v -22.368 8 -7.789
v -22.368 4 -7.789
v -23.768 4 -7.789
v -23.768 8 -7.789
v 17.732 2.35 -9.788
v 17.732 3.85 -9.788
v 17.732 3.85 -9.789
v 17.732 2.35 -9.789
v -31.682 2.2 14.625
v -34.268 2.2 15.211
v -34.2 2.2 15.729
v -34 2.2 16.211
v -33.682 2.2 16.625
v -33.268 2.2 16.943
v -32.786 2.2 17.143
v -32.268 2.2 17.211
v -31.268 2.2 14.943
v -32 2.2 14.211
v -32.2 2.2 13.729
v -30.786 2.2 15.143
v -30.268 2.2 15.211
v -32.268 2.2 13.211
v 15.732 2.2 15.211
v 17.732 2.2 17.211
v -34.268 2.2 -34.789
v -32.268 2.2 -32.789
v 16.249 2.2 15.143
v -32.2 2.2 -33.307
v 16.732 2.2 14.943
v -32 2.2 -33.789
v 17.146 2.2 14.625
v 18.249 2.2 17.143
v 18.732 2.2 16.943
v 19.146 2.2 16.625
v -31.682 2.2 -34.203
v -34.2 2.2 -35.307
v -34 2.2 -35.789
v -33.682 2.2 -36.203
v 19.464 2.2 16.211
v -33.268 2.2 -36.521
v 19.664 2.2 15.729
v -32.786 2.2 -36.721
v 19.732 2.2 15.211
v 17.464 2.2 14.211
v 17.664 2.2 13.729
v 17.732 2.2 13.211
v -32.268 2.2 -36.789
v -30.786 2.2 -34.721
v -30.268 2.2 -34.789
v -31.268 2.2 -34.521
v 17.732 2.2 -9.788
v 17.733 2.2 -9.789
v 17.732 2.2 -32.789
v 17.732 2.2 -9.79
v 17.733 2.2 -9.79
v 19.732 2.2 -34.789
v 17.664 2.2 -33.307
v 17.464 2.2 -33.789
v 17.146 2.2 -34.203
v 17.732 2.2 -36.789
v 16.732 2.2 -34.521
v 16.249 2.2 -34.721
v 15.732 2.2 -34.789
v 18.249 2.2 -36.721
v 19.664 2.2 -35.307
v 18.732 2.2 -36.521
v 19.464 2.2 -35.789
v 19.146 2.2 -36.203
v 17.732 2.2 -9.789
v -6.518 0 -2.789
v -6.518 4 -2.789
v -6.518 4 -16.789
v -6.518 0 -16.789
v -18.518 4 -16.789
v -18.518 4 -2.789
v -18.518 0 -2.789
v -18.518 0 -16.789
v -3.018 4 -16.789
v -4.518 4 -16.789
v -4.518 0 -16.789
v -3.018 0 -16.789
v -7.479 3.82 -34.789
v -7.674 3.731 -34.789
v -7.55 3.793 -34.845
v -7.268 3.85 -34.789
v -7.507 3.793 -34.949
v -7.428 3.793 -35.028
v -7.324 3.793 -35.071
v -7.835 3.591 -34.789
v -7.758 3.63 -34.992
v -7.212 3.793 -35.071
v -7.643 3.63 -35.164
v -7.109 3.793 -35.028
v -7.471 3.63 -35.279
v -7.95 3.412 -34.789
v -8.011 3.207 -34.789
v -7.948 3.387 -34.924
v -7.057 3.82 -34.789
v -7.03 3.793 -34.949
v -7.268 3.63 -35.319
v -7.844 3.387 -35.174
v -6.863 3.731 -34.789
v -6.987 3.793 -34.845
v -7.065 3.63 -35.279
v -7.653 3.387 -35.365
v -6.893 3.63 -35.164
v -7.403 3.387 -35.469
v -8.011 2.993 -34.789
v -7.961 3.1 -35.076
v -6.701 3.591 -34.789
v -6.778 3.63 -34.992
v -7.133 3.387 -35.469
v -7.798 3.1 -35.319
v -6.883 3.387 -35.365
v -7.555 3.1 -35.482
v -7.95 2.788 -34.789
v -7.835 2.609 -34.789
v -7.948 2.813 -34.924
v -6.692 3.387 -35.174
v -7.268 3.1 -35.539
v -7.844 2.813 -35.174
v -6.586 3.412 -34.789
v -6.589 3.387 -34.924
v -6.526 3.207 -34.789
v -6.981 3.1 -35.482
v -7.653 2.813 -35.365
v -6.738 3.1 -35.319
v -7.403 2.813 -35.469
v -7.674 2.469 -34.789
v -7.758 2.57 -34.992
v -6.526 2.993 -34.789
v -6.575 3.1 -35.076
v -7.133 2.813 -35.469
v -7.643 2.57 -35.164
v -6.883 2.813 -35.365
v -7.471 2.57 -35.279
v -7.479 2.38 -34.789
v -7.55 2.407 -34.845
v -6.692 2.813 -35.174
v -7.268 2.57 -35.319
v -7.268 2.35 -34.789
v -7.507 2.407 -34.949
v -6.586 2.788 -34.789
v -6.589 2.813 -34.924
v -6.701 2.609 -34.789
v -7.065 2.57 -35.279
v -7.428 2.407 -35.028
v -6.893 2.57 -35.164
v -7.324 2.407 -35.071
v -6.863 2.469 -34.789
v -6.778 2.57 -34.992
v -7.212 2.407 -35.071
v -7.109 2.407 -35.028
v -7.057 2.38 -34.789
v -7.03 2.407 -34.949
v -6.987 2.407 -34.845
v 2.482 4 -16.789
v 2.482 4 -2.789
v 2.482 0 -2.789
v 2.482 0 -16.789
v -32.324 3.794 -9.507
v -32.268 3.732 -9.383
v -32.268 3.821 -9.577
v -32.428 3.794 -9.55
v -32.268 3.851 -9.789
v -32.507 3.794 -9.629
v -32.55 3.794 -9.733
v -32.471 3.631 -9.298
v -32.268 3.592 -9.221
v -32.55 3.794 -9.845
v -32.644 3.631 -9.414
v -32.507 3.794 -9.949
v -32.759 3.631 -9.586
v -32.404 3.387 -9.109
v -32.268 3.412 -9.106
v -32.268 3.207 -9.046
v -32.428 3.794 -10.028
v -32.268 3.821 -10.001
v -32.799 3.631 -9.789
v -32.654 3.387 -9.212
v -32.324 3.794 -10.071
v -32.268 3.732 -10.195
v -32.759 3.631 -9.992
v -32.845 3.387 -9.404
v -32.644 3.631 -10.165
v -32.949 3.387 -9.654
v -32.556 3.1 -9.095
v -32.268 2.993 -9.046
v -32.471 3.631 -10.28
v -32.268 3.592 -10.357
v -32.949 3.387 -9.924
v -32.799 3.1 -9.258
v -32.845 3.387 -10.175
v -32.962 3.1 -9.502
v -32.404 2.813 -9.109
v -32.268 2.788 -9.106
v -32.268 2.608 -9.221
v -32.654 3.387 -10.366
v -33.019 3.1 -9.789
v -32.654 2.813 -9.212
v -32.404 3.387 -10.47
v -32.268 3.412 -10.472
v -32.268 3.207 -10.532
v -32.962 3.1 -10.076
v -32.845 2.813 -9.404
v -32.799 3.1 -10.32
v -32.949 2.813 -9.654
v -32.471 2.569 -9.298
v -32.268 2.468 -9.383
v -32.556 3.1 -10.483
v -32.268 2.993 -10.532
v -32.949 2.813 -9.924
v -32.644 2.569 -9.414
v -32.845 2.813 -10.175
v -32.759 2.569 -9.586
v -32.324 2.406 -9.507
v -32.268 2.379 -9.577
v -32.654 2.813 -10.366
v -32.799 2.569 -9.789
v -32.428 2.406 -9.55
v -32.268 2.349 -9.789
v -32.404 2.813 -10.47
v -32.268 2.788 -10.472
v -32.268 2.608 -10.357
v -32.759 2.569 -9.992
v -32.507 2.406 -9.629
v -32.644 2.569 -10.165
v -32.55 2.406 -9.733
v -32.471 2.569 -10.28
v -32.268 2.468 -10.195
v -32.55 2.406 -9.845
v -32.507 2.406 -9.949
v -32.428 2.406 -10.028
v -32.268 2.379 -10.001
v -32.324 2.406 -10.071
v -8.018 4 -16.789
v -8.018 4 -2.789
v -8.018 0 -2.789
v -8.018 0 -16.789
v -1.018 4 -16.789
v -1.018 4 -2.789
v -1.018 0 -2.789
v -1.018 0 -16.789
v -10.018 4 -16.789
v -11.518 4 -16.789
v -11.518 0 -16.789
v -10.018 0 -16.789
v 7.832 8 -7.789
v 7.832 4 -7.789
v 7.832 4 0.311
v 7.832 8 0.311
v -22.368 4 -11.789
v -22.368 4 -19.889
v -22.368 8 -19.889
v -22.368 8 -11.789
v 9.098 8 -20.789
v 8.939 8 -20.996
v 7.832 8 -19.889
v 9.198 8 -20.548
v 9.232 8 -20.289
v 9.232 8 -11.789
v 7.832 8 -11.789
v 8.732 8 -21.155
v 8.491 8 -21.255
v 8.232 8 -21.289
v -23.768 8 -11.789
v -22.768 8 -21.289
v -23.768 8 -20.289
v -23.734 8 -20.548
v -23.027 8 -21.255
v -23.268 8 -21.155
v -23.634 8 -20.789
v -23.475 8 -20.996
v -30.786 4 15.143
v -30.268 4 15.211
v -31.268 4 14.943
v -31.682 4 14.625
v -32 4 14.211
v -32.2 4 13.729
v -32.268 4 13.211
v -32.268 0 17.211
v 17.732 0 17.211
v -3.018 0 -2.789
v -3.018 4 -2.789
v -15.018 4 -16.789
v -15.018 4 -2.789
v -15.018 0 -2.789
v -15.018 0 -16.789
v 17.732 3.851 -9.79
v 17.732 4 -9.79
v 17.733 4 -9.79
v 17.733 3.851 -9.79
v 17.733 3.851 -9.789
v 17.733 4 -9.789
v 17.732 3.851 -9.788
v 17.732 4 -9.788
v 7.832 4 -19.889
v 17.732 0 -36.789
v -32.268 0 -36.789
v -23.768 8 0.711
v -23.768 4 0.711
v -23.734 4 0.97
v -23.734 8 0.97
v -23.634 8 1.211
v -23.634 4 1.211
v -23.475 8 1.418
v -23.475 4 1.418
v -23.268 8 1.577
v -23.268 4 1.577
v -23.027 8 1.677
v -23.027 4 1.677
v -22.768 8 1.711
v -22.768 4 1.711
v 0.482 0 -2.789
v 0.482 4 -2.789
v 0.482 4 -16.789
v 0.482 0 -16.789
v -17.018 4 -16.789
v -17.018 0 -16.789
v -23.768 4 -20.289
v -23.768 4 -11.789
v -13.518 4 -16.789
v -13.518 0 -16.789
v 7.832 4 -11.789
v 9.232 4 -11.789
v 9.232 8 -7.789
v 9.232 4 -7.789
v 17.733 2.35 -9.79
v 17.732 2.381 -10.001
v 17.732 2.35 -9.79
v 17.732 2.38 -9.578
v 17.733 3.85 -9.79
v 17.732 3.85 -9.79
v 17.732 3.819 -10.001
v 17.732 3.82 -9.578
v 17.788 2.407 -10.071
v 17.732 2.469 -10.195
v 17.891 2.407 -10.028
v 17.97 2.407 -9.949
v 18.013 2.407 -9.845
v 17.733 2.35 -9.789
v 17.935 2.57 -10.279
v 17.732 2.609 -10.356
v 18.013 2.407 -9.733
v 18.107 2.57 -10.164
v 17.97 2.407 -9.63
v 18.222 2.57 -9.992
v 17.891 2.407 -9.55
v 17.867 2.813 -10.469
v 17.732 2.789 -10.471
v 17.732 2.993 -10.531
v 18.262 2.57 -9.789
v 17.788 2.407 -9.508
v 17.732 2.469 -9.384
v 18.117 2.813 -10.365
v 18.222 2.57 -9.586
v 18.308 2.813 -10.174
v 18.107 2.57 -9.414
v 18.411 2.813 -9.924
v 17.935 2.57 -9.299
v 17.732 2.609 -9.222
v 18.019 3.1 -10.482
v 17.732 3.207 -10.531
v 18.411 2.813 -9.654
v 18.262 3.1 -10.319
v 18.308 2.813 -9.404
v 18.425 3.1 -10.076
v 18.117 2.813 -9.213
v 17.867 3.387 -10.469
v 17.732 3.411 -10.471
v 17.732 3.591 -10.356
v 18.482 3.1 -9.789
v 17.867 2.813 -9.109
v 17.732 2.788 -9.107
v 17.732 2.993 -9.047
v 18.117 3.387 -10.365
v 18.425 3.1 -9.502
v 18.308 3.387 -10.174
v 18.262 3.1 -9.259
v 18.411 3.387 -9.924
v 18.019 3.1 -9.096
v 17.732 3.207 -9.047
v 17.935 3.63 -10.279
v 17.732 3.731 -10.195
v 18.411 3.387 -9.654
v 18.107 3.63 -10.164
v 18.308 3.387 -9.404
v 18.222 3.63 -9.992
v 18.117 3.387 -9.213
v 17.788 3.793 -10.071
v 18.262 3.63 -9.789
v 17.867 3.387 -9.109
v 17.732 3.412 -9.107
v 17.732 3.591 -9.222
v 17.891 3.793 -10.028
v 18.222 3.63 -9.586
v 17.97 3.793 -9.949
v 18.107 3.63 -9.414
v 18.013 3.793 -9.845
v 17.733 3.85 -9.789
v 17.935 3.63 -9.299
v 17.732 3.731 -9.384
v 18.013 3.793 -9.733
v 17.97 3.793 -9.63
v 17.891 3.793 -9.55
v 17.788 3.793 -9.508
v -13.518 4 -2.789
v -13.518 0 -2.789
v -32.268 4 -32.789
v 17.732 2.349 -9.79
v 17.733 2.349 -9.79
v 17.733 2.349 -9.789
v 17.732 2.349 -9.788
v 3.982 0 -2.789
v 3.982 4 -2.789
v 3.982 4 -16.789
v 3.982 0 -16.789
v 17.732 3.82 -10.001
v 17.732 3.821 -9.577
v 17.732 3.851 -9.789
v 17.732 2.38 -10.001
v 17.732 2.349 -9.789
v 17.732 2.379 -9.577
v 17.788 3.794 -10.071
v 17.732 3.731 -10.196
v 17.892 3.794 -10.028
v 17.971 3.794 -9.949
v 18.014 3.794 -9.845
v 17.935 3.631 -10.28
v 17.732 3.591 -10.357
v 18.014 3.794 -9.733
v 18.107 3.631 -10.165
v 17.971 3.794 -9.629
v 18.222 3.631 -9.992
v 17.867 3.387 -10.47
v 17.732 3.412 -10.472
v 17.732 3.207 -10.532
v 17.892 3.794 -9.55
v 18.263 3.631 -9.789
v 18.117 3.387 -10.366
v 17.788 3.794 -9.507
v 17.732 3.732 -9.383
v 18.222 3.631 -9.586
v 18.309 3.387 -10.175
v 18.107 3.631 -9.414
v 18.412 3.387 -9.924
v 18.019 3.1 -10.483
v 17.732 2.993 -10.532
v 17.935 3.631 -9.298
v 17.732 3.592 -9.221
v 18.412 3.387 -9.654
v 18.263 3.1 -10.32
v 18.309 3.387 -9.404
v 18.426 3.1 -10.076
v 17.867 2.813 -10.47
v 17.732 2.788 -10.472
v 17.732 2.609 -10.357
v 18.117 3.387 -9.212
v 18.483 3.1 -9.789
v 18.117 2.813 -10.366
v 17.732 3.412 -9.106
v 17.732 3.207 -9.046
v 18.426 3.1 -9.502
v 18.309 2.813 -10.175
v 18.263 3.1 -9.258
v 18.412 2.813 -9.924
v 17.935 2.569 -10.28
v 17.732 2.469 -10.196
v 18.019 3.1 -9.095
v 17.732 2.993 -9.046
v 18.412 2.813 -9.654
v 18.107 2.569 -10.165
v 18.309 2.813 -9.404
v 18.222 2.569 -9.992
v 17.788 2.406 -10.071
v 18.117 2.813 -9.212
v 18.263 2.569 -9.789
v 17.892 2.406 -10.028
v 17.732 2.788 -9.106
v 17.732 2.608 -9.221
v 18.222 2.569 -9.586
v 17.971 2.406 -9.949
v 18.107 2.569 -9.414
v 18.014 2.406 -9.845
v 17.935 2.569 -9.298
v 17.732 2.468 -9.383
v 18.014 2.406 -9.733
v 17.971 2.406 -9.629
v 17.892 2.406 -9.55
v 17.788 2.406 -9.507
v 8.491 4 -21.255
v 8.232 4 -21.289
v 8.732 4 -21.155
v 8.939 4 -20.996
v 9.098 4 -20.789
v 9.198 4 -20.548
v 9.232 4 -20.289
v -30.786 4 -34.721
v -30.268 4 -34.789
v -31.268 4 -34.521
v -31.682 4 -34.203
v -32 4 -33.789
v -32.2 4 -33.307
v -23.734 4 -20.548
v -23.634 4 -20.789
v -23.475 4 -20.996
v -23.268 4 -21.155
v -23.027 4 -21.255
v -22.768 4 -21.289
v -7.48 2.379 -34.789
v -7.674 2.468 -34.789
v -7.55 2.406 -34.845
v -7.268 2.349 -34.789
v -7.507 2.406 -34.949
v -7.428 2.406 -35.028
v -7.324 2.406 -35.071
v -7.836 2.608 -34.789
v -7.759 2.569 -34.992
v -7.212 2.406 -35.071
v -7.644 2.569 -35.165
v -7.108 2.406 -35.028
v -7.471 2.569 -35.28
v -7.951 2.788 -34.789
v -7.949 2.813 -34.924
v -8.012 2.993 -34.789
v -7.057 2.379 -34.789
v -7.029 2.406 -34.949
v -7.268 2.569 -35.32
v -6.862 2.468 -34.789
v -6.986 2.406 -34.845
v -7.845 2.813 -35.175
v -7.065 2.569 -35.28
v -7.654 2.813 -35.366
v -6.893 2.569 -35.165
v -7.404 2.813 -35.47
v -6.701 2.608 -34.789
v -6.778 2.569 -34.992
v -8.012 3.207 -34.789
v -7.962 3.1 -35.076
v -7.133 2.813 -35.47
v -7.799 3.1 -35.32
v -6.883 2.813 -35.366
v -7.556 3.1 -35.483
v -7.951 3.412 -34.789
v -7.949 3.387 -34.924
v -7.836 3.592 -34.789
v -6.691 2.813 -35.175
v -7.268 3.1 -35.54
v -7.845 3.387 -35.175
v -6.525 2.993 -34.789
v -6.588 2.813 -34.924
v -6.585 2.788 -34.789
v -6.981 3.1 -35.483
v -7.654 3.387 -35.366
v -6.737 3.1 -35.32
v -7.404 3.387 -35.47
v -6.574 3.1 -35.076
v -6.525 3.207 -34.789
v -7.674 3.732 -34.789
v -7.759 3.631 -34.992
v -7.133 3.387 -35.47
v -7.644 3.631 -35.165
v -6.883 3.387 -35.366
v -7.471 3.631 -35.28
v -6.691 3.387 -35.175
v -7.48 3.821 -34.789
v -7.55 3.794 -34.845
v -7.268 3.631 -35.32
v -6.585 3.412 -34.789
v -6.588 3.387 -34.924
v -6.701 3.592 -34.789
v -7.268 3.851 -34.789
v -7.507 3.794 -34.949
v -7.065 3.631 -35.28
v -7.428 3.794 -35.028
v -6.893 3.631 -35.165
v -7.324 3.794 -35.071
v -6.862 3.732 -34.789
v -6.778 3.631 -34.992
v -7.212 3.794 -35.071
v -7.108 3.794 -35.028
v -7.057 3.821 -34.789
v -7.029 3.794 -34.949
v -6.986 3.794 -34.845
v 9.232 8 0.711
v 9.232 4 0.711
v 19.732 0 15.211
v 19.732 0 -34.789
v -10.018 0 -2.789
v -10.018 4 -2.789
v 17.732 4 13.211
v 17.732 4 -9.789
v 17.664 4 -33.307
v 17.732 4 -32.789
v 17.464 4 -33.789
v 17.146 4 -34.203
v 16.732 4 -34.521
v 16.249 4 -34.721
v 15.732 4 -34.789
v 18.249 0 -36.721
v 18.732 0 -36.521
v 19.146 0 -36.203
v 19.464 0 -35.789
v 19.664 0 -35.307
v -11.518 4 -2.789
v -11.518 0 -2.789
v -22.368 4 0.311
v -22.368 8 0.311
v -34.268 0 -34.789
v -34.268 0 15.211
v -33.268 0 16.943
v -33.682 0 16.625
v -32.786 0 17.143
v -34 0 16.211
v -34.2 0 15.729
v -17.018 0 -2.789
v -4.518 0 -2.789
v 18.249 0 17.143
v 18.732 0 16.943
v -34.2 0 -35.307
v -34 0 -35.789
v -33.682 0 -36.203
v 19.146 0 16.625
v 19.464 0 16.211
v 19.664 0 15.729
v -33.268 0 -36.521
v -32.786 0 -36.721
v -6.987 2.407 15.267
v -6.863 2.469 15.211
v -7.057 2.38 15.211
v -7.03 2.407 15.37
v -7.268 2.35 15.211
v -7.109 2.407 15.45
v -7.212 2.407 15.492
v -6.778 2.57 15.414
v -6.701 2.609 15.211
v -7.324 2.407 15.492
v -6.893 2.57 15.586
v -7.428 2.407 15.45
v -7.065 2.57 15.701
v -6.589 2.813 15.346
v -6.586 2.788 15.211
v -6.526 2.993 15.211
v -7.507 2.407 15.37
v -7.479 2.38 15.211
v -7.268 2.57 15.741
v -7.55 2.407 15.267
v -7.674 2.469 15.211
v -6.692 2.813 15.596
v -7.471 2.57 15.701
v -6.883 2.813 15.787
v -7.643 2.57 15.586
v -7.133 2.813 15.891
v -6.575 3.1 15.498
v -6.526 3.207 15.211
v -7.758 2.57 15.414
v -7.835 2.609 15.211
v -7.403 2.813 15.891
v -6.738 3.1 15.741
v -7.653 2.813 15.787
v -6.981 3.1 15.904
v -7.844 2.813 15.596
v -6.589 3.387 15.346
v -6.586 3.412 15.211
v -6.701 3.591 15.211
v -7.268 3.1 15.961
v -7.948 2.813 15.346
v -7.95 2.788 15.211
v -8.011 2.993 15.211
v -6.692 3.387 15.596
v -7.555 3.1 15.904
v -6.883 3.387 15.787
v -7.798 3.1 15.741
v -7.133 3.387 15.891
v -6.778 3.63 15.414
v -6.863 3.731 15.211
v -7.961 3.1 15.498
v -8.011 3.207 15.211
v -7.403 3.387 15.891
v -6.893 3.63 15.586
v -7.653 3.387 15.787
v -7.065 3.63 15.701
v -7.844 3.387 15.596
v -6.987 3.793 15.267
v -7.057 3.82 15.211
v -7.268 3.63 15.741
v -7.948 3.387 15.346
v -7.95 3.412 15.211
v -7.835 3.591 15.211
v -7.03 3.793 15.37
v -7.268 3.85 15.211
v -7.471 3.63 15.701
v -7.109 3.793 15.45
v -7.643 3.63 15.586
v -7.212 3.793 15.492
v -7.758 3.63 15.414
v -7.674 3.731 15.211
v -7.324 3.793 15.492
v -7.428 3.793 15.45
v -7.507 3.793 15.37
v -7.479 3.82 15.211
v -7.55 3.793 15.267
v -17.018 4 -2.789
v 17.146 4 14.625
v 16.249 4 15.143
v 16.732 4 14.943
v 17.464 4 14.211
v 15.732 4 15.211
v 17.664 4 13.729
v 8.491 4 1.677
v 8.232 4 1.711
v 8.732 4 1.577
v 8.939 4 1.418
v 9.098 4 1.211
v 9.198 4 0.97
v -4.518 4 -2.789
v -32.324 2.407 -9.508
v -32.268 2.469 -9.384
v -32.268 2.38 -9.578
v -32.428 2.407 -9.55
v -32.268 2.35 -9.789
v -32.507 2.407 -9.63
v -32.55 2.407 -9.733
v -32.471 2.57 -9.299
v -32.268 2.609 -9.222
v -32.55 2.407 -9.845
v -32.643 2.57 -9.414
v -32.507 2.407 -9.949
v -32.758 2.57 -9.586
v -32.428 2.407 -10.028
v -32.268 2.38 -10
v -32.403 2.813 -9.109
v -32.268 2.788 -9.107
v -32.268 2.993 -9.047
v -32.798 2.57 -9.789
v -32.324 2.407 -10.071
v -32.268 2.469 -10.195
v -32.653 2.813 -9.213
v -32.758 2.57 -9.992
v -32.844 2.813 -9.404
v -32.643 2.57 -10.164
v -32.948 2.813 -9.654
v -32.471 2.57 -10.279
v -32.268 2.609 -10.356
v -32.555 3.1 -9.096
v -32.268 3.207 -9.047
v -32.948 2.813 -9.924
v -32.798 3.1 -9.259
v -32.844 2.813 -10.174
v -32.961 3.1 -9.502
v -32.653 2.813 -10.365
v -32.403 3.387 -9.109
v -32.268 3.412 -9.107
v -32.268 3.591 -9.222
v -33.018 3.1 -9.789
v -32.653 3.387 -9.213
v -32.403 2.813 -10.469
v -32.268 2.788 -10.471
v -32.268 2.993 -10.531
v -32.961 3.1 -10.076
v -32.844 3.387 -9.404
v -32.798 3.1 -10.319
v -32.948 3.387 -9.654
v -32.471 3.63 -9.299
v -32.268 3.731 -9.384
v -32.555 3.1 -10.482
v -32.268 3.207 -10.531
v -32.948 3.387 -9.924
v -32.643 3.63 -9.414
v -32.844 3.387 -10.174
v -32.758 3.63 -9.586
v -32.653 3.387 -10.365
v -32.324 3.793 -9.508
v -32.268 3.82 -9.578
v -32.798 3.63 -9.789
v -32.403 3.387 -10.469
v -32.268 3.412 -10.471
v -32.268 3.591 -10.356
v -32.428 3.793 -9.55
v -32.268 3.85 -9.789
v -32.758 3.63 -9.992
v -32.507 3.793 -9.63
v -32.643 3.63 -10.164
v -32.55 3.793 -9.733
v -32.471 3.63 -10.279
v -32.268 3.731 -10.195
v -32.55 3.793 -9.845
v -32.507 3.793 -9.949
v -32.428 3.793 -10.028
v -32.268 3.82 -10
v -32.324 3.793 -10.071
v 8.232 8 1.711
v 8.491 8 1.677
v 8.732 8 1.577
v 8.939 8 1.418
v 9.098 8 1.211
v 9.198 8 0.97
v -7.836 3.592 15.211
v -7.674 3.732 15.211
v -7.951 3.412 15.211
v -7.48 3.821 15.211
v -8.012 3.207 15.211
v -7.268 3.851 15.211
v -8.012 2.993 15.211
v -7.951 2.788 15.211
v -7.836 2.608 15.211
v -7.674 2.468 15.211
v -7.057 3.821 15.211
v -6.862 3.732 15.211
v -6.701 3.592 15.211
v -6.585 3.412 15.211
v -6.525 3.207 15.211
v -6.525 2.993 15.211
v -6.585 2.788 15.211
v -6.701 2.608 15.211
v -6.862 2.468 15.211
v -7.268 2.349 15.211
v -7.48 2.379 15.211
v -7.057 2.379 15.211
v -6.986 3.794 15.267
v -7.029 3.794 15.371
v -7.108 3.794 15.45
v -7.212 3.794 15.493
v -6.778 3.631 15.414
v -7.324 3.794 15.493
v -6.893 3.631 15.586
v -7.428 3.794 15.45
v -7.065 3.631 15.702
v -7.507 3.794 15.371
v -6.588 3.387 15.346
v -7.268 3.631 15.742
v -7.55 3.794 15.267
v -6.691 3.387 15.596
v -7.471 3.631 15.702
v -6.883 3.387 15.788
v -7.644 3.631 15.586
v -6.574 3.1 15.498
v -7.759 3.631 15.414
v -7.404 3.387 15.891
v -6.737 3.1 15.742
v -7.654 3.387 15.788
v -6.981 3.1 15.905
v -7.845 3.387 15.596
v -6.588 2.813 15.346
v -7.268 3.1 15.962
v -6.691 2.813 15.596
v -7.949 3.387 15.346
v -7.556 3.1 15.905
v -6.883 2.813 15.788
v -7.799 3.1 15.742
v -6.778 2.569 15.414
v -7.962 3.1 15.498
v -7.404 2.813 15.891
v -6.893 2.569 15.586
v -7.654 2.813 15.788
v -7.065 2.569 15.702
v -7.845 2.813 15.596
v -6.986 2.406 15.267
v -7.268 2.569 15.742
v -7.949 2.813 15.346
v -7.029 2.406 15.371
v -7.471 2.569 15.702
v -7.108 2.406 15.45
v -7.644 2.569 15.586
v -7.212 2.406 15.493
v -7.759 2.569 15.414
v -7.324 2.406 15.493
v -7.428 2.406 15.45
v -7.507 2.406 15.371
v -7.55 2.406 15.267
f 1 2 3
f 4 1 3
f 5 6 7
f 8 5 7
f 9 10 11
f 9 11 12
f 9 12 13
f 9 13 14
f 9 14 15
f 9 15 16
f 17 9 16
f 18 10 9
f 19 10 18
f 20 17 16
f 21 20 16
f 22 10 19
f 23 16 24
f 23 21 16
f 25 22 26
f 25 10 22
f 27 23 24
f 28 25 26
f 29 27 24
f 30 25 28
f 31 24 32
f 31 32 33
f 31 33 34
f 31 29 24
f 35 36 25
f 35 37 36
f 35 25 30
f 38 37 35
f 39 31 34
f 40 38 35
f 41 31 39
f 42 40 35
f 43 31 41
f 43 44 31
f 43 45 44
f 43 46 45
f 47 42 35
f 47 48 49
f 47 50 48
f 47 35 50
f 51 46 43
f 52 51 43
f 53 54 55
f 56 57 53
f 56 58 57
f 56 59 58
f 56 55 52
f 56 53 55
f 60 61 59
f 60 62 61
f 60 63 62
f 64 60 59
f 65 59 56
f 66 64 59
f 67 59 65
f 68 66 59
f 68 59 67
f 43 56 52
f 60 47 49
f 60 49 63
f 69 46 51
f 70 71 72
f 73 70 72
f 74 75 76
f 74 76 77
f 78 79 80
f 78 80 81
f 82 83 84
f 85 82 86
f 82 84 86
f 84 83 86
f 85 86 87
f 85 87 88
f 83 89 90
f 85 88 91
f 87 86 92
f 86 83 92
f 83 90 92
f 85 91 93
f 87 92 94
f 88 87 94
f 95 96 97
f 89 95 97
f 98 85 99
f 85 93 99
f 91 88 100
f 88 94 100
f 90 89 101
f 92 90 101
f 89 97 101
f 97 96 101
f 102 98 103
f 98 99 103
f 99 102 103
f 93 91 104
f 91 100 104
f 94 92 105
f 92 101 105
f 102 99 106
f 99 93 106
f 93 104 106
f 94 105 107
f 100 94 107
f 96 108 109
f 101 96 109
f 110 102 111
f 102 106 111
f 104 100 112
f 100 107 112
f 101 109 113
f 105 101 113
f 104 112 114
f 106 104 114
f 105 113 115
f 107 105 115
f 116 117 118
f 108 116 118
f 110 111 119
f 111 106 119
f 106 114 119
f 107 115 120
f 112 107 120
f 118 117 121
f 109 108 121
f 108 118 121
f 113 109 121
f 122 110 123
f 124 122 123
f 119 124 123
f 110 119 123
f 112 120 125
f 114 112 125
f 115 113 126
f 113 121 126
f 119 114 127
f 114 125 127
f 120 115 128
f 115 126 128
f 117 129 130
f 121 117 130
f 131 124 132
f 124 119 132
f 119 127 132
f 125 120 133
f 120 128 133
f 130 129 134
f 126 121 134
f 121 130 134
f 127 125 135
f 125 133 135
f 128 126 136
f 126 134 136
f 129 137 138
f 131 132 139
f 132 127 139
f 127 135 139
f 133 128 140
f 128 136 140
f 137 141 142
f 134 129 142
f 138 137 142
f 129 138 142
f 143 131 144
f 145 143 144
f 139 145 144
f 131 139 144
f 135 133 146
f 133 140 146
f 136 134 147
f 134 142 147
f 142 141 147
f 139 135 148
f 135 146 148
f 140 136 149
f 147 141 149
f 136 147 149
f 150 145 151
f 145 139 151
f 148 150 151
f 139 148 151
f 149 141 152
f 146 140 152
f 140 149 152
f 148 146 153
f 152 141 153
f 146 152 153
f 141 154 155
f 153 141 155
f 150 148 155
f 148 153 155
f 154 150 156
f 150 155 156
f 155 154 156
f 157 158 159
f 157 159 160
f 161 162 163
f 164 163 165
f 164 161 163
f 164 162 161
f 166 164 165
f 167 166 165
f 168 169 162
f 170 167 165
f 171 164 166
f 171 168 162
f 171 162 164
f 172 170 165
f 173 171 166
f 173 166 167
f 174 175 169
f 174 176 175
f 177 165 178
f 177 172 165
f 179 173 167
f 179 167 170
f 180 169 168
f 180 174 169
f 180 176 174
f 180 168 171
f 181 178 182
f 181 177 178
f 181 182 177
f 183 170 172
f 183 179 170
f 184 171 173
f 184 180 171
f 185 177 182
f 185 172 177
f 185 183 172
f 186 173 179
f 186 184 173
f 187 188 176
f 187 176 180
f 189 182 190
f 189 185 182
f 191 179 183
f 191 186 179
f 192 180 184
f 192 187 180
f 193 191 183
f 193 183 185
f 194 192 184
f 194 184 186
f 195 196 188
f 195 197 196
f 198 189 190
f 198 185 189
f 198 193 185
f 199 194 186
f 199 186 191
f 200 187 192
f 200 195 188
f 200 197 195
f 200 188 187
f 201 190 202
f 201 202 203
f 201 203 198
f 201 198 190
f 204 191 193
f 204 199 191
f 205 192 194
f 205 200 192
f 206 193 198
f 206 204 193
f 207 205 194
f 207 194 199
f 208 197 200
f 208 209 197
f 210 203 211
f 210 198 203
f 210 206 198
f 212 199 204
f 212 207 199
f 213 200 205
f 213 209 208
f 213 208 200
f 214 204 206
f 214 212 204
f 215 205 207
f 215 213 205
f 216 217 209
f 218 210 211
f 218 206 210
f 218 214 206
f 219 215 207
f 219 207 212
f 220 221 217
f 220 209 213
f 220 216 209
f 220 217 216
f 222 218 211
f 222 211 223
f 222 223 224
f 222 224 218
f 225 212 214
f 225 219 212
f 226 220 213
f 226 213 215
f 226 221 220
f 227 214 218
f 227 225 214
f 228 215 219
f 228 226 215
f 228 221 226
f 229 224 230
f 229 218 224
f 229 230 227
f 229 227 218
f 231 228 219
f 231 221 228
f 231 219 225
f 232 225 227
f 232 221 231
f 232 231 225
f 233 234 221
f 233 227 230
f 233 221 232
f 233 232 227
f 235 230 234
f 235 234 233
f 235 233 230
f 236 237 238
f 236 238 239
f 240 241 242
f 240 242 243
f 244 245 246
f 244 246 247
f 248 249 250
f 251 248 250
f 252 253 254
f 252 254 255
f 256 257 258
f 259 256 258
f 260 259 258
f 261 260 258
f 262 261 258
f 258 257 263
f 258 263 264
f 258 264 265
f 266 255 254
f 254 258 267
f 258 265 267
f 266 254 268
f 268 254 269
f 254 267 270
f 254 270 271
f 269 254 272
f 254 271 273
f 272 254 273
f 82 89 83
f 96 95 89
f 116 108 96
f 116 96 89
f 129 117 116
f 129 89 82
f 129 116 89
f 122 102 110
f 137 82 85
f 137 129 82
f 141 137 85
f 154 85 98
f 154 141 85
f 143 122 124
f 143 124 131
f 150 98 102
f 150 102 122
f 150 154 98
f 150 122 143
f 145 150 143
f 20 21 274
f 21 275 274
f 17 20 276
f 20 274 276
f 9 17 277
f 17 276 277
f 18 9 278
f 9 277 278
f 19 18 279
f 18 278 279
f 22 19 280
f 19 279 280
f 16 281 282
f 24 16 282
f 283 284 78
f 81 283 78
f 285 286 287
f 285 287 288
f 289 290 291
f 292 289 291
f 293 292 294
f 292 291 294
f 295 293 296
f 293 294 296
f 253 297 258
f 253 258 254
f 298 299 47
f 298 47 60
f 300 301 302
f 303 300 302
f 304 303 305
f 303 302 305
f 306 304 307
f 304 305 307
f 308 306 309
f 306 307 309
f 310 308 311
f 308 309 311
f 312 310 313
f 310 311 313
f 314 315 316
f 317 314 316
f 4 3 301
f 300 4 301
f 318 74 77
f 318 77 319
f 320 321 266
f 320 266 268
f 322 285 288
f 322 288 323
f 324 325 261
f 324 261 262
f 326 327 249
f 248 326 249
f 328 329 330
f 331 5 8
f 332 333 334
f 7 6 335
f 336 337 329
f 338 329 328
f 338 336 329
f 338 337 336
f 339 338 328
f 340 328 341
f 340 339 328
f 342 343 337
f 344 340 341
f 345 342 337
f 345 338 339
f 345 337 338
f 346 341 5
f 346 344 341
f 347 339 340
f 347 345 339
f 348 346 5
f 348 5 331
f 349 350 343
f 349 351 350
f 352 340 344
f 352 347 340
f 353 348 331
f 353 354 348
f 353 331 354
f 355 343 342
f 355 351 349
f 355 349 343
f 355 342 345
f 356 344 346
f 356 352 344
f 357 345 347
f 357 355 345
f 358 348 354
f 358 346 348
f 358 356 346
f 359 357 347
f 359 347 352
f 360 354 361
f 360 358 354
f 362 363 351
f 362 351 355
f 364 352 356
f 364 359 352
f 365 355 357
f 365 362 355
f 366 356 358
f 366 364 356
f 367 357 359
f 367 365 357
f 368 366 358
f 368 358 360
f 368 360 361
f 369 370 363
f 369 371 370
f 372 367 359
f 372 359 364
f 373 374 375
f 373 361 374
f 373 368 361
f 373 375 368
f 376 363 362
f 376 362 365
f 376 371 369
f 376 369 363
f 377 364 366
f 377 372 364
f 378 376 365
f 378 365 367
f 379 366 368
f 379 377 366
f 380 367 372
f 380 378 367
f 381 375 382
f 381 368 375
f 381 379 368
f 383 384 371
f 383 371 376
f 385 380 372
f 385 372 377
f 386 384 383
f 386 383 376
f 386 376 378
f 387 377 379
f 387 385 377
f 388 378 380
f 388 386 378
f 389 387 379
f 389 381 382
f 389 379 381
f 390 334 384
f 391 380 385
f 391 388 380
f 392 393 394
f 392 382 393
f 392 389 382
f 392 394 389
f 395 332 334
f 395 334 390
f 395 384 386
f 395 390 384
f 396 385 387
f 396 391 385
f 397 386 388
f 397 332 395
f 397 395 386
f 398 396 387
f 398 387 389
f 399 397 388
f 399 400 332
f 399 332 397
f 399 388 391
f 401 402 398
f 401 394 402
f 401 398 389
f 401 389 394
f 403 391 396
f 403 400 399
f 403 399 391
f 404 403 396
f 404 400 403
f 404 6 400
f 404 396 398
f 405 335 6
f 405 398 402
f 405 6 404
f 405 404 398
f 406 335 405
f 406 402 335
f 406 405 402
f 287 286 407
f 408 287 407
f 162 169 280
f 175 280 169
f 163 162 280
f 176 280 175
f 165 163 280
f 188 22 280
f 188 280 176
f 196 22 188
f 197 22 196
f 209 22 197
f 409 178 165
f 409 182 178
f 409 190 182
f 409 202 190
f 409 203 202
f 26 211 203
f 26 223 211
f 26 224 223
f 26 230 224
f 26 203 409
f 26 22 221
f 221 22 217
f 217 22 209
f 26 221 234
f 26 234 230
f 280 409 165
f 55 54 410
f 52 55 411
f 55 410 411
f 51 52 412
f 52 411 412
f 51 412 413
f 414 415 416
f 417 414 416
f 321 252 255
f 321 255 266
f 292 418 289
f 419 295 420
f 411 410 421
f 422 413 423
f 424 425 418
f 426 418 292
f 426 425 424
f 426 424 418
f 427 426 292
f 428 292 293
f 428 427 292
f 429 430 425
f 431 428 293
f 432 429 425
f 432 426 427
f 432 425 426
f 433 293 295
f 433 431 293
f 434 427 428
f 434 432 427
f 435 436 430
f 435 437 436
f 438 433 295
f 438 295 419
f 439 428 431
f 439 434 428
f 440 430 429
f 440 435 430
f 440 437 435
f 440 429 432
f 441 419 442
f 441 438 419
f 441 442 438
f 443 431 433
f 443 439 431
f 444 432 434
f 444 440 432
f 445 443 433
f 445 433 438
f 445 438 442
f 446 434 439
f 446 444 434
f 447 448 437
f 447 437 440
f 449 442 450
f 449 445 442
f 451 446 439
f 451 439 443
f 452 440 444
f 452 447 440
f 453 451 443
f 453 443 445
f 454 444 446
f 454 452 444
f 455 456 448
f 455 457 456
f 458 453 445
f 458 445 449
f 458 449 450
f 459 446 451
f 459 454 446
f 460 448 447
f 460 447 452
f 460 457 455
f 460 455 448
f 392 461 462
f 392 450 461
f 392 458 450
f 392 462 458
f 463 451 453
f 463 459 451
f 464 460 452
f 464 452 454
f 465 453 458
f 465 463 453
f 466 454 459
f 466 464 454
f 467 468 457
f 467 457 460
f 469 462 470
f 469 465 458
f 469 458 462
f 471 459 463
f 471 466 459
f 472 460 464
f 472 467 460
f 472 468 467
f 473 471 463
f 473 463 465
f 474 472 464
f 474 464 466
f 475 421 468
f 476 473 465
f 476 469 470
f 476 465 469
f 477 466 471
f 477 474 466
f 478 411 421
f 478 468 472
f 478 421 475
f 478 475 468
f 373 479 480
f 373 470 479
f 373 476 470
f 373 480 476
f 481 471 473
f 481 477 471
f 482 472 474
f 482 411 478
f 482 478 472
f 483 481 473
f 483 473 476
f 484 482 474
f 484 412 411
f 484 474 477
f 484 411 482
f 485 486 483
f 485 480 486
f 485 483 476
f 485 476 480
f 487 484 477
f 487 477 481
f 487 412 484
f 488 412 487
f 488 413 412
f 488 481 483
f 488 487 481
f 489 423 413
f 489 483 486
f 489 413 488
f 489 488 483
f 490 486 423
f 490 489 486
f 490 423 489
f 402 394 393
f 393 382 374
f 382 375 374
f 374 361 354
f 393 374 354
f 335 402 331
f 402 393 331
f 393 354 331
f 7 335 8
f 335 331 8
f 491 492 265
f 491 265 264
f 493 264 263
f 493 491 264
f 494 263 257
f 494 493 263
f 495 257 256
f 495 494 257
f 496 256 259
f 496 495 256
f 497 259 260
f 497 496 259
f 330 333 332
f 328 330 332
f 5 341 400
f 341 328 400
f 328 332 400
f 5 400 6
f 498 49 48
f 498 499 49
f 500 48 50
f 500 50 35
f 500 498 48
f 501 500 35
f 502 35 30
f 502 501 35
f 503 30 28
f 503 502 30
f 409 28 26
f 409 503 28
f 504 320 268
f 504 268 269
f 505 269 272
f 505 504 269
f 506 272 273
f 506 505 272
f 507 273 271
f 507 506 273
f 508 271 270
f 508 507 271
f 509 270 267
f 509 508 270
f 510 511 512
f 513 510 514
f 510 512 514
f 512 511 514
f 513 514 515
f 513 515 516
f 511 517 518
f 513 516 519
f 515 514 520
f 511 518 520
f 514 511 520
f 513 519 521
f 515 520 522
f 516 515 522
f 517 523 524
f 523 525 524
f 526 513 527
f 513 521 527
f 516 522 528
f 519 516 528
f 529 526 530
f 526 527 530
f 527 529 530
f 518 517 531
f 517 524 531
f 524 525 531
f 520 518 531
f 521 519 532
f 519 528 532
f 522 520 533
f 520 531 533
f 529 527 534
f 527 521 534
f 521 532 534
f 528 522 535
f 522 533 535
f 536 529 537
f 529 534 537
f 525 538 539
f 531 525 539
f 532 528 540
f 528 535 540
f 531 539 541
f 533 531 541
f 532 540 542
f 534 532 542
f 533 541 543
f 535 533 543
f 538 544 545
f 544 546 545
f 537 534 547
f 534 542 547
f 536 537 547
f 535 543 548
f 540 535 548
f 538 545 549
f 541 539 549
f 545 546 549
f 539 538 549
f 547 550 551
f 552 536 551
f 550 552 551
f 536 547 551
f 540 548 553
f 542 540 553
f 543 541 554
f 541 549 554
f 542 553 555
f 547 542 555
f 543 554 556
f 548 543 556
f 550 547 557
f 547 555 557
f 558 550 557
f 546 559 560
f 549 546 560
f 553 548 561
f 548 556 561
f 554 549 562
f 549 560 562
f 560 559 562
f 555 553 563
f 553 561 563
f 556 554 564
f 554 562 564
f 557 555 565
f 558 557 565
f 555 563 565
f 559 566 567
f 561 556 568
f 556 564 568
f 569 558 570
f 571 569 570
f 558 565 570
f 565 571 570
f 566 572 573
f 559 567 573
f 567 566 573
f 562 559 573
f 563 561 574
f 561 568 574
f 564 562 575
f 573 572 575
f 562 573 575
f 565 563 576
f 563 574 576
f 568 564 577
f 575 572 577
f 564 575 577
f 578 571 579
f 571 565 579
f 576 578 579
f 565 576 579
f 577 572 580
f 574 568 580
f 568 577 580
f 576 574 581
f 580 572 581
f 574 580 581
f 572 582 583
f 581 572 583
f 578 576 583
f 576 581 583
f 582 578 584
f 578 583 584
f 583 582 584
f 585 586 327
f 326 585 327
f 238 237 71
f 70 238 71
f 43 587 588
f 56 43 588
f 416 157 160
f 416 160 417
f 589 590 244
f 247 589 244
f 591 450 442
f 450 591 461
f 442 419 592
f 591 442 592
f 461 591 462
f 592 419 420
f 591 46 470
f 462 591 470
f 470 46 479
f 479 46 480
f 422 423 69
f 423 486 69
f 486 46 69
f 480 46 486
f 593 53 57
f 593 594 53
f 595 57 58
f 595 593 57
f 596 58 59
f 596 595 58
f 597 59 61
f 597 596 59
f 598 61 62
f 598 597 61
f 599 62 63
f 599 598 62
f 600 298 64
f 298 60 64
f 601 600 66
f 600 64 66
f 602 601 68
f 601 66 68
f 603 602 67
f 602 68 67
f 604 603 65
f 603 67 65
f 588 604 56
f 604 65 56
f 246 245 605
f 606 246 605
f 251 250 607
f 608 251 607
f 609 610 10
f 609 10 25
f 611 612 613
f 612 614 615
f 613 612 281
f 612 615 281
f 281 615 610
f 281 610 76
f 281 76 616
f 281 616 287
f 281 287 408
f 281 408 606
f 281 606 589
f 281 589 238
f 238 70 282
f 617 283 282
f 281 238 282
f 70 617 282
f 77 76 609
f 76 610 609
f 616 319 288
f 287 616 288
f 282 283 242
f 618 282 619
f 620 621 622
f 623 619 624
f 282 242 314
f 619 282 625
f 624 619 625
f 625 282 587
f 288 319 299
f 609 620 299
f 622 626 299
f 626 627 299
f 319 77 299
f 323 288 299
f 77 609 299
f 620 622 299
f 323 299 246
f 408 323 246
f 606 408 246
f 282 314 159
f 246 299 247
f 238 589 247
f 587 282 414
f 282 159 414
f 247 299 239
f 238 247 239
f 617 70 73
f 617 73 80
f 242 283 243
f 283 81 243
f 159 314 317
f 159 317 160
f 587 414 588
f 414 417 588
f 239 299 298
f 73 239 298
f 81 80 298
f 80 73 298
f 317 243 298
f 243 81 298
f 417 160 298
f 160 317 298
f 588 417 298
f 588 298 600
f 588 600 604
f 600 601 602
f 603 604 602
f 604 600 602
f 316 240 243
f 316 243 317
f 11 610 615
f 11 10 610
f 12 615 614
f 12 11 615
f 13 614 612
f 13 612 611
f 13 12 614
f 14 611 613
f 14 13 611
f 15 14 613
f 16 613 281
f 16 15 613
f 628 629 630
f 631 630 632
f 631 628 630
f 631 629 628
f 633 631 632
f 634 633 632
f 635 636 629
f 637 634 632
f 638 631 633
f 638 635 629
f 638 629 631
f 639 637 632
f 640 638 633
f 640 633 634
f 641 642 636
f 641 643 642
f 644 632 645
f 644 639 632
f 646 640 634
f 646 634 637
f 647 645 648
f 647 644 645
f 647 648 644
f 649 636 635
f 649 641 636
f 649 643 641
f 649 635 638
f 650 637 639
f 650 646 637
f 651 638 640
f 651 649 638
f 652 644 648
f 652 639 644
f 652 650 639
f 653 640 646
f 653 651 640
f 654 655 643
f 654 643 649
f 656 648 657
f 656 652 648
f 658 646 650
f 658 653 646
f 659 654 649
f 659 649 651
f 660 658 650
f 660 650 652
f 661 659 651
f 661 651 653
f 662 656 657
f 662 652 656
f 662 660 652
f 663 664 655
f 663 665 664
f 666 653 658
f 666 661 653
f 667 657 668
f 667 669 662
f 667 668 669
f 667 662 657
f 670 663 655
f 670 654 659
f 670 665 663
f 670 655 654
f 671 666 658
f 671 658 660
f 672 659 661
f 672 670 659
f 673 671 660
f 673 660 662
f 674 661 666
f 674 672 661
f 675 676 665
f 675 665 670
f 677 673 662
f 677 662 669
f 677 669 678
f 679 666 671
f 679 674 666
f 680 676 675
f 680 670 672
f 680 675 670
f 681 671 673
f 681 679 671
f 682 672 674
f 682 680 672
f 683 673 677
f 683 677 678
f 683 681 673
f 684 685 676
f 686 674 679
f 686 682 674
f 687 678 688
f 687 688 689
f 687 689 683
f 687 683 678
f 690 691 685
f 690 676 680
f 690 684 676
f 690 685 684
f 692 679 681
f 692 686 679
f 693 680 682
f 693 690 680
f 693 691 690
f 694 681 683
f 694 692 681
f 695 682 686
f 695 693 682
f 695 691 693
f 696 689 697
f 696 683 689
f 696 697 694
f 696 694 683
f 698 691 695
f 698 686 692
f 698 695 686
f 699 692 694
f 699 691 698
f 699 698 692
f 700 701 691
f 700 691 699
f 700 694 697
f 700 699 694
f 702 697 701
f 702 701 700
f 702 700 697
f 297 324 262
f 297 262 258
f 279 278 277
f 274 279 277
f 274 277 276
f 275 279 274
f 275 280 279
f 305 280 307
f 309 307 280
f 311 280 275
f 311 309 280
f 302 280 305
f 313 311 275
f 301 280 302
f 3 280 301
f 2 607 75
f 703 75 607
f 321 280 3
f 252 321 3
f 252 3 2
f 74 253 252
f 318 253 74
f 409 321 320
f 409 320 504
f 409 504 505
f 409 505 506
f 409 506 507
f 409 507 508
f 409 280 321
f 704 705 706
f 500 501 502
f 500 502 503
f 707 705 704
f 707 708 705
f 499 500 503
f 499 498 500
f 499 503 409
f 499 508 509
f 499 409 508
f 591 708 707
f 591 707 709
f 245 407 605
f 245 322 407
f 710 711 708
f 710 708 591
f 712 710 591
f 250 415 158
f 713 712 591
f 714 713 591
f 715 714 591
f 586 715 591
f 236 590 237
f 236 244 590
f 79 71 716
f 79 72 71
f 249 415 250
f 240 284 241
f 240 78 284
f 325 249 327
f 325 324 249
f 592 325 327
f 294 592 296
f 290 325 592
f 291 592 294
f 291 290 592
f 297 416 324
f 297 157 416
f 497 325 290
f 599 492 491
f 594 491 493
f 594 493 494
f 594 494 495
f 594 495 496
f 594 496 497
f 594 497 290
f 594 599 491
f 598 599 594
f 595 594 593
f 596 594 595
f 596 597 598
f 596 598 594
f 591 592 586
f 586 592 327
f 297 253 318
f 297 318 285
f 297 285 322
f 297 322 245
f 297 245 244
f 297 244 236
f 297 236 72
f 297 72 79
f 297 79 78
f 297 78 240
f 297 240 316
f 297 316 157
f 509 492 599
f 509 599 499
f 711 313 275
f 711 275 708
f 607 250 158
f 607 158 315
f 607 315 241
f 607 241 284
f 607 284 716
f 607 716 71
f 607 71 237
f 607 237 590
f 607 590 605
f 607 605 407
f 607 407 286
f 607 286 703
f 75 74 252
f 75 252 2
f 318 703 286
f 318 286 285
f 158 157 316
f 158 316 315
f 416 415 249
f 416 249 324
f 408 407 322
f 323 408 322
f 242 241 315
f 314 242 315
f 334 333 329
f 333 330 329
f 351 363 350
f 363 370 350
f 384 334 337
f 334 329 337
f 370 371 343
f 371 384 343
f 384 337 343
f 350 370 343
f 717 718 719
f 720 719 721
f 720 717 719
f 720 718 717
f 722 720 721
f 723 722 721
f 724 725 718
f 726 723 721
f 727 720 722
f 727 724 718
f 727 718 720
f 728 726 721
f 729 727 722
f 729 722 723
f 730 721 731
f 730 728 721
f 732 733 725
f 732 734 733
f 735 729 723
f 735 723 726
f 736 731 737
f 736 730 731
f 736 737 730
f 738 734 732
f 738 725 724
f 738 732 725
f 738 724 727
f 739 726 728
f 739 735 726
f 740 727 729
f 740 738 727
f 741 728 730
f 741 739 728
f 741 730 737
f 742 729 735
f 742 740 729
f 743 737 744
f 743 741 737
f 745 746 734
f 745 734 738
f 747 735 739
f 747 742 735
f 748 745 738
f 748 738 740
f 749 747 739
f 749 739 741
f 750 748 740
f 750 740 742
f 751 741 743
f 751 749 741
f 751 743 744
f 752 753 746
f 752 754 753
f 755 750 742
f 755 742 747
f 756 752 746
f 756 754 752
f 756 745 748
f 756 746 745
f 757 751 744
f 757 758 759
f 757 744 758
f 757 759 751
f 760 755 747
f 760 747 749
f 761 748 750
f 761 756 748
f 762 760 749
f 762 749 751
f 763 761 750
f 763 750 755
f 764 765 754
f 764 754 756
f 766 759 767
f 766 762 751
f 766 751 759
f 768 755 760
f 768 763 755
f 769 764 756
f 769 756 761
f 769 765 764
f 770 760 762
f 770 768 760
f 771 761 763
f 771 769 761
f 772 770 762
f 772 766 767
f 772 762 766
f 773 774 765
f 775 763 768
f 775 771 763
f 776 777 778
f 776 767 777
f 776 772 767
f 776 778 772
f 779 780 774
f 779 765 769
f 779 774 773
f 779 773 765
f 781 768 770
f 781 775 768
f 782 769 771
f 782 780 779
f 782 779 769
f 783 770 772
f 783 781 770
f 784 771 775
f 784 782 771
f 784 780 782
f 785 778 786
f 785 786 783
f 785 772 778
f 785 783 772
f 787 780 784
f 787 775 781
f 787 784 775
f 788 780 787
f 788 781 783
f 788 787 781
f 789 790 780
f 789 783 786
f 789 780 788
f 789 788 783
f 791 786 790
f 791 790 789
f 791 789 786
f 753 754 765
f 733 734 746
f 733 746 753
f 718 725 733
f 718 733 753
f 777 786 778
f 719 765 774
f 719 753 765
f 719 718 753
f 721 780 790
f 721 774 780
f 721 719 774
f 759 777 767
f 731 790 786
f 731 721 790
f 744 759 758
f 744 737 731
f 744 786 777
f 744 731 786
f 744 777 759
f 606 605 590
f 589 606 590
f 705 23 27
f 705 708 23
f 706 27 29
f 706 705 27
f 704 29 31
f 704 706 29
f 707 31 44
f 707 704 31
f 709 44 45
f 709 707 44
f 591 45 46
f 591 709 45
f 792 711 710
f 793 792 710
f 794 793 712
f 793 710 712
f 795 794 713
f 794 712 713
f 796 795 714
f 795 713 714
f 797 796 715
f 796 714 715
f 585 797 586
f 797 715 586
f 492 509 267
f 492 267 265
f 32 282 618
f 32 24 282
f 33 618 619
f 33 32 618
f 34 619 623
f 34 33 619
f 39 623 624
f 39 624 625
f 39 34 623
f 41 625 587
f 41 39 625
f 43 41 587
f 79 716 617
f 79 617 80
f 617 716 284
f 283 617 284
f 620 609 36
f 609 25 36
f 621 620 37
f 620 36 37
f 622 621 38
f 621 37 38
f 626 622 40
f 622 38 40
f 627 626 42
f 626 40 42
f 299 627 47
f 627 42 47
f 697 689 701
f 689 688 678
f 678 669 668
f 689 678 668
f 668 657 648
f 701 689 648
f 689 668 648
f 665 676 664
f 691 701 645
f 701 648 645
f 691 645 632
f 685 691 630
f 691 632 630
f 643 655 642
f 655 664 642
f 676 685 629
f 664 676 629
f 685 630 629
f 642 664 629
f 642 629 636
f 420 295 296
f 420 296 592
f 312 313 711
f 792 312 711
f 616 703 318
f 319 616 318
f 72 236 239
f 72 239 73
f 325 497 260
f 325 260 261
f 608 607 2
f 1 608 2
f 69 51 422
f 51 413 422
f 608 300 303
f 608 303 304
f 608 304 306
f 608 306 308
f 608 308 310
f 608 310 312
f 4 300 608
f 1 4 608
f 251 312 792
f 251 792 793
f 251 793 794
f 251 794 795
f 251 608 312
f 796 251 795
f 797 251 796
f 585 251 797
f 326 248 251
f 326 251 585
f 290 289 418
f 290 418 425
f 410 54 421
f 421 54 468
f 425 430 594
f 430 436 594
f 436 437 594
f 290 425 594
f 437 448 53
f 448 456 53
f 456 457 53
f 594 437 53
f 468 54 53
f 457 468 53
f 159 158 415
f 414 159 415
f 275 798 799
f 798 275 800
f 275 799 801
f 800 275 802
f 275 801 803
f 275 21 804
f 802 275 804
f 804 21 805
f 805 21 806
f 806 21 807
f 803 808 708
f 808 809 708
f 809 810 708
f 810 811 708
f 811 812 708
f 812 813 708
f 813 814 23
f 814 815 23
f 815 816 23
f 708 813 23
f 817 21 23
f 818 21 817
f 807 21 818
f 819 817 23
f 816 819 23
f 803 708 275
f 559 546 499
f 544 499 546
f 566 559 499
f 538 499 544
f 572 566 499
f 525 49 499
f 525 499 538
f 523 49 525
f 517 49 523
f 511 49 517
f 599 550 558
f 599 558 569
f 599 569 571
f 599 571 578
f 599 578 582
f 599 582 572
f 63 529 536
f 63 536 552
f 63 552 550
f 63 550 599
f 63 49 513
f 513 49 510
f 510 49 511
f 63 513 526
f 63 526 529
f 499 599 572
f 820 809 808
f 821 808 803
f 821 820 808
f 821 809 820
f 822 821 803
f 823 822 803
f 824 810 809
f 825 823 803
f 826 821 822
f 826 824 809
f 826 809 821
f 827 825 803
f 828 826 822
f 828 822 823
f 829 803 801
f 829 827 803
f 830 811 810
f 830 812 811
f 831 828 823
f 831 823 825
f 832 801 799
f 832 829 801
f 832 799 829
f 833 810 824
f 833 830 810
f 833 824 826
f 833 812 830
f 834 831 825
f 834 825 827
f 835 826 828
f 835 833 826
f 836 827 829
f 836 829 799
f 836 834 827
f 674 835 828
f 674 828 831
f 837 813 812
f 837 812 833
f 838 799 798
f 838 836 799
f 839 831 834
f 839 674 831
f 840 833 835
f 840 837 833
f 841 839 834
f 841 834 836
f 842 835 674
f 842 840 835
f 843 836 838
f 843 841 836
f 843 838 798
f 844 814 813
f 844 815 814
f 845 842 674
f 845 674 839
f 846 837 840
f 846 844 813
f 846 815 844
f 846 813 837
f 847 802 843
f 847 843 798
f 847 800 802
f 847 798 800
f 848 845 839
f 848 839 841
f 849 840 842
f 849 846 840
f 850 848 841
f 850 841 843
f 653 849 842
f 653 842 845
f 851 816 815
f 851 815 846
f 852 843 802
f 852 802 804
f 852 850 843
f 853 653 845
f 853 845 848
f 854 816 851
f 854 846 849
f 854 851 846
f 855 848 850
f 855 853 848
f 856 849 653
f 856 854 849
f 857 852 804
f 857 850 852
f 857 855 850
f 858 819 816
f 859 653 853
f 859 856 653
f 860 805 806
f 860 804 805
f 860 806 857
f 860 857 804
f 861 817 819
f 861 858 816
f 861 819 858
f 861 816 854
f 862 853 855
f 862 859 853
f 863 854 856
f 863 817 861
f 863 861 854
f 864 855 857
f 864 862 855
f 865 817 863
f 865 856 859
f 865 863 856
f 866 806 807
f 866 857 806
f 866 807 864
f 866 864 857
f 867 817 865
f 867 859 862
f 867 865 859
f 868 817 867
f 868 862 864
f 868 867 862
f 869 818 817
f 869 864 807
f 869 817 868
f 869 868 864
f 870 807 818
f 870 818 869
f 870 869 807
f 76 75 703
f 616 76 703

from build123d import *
from build123d.topology import SkipClean

# Parameters (mm, degrees)
SKETCH_1_W          = 54
SKETCH_1_H          = 54
EXTRUDE_2_DEPTH     = 2.2
SKETCH_7_W          = 50
SKETCH_7_H          = 50
EXTRUDE_3_DEPTH     = 1.8
EXTRUDE_5_DEPTH     = 4
SKETCH_9_8_W        = 1.5
SKETCH_9_8_H        = 7
SKETCH_9_8_H_2      = 14
CUT_EXTRUDE_2_DEPTH = 10
FILLET_1_R          = 2
SKETCH_15_W         = 0.001
SKETCH_15_H         = 1.8
REVOLVE_8_ANGLE     = 332


with BuildPart() as part:
    # 草图1 → 凸台-拉伸2 (new body)
    with BuildSketch(Plane(origin=(0, 0, 0), x_dir=(1, 0, 0), z_dir=(0, 1, 0))):
        with Locations((-7.2681601, 9.789048154)):
            Rectangle(SKETCH_1_W, SKETCH_1_H)
    extrude(amount=EXTRUDE_2_DEPTH)

    # 草图7 → 凸台-拉伸3 (add)
    with BuildSketch(Plane(origin=(0, 2.2, 0), x_dir=(1, 0, 0), z_dir=(0, 1, 0))):
        with Locations((-7.2681601, 9.789048154)):
            Rectangle(SKETCH_7_W, SKETCH_7_H)
    extrude(amount=EXTRUDE_3_DEPTH)

    # 草图9 → 凸台-拉伸5 (add)
    with BuildSketch(Plane(origin=(0, 4, 0), x_dir=(1, 0, 0), z_dir=(0, 1, 0))):
        with BuildLine():
            Line((-22.7681601, -1.710951846), (8.2318399, -1.710951846))
            ThreePointArc((8.2318399, -1.710951846), (8.938946681, -1.418058627), (9.2318399, -0.710951846))
            Line((9.2318399, -0.710951846), (9.2318399, 7.789048154))
            Line((9.2318399, 7.789048154), (7.8318399, 7.789048154))
            Line((7.8318399, 7.789048154), (7.8318399, -0.310951846))
            Line((7.8318399, -0.310951846), (-22.3681601, -0.310951846))
            Line((-22.3681601, -0.310951846), (-22.3681601, 7.789048154))
            Line((-22.3681601, 7.789048154), (-23.7681601, 7.789048154))
            Line((-23.7681601, 7.789048154), (-23.7681601, -0.710951846))
            ThreePointArc((-23.7681601, -0.710951846), (-23.475266881, -1.418058627), (-22.7681601, -1.710951846))
        make_face()
        with BuildLine():
            Line((-22.7681601, 21.289048154), (8.2318399, 21.289048154))
            ThreePointArc((8.2318399, 21.289048154), (8.938946681, 20.996154935), (9.2318399, 20.289048154))
            Line((9.2318399, 20.289048154), (9.2318399, 11.789048154))
            Line((9.2318399, 11.789048154), (7.8318399, 11.789048154))
            Line((7.8318399, 11.789048154), (7.8318399, 19.889048154))
            Line((7.8318399, 19.889048154), (-22.3681601, 19.889048154))
            Line((-22.3681601, 19.889048154), (-22.3681601, 11.789048154))
            Line((-22.3681601, 11.789048154), (-23.7681601, 11.789048154))
            Line((-23.7681601, 11.789048154), (-23.7681601, 20.289048154))
            ThreePointArc((-23.7681601, 20.289048154), (-23.475266881, 20.996154935), (-22.7681601, 21.289048154))
        make_face()
    extrude(amount=EXTRUDE_5_DEPTH)

    # 草图9<8> → 切除-拉伸2 (cut)
    with BuildSketch(Plane(origin=(0, 4, 0), x_dir=(1, 0, 0), z_dir=(0, 1, 0))):
        with Locations((-10.7681601, 13.289048154)):
            Rectangle(SKETCH_9_8_W, SKETCH_9_8_H)
        with Locations((-10.7681601, 6.289048154)):
            Rectangle(SKETCH_9_8_W, SKETCH_9_8_H)
        with Locations((-7.2681601, 9.789048154)):
            Rectangle(SKETCH_9_8_W, SKETCH_9_8_H_2)
        with Locations((-14.2681601, 9.789048154)):
            Rectangle(SKETCH_9_8_W, SKETCH_9_8_H_2)
        with Locations((-17.7681601, 9.789048154)):
            Rectangle(SKETCH_9_8_W, SKETCH_9_8_H_2)
        with Locations((-3.7681601, 9.789048154)):
            Rectangle(SKETCH_9_8_W, SKETCH_9_8_H_2)
        with Locations((-0.2681601, 9.789048154)):
            Rectangle(SKETCH_9_8_W, SKETCH_9_8_H_2)
        with Locations((3.2318399, 9.789048154)):
            Rectangle(SKETCH_9_8_W, SKETCH_9_8_H_2)
    extrude(amount=-CUT_EXTRUDE_2_DEPTH, mode=Mode.SUBTRACT)

    # 圆角1
    fillet_1_edges = [part.edges().sort_by_distance(p)[0] for p in [
        (17.7318399, 3.1, 15.210951846),
        (17.7318399, 3.1, -34.789048154),
        (-32.2681601, 3.1, -34.789048154),
        (-32.2681601, 3.1, 15.210951846),
        (-34.2681601, 1.1, -36.789048154),
        (19.7318399, 1.1, -36.789048154),
        (19.7318399, 1.1, 17.210951846),
        (-34.2681601, 1.1, 17.210951846),
    ]]
    fillet(fillet_1_edges, radius=FILLET_1_R)

    # 草图12 → 旋转-薄壁5 (revolve)
    with BuildSketch(Plane.XY.offset(15.210951846)):
        with BuildLine():
            ThreePointArc((-7.2681601, 2.35), (-6.5181601, 3.1), (-7.2681601, 3.85))
            Line((-7.2681601, 3.85), (-7.2681601, 3.851))
            ThreePointArc((-7.2681601, 3.851), (-6.5171601, 3.1), (-7.2681601, 2.349))
            Line((-7.2681601, 2.349), (-7.2681601, 2.35))
        make_face()
    revolve(axis=Axis((-7.2681601, 4, 15.210951846), (0, -1, 0)))

    # 草图13 → 旋转-薄壁6 (revolve)
    with BuildSketch(Plane.ZY.offset(32.2681601)):
        with BuildLine():
            ThreePointArc((-9.789048154, 2.35), (-9.039048154, 3.1), (-9.789048154, 3.85))
            Line((-9.789048154, 3.85), (-9.789048154, 3.851))
            ThreePointArc((-9.789048154, 3.851), (-9.038048154, 3.1), (-9.789048154, 2.349))
            Line((-9.789048154, 2.349), (-9.789048154, 2.35))
        make_face()
    revolve(axis=Axis((-32.2681601, 4, -9.789048154), (0, -1, 0)))

    # 草图15 → 旋转-薄壁8 (revolve)
    with SkipClean():  # the faces are left unmerged after this step: merging them gives an invalid solid
        with BuildSketch(Plane(origin=(17.7318399, 0, 0), x_dir=(0, 0, -1), z_dir=(1, 0, 0))):
            with Locations((9.788548154, 3.1)):
                Rectangle(SKETCH_15_W, SKETCH_15_H)
            with BuildLine():
                ThreePointArc((9.789048154, 2.35), (10.539048154, 3.1), (9.789048154, 3.85))
                Line((9.789048154, 3.85), (9.789048154, 3.851))
                ThreePointArc((9.789048154, 3.851), (10.540048154, 3.1), (9.789048154, 2.349))
                Line((9.789048154, 2.349), (9.789048154, 2.35))
            make_face()
        revolve(axis=Axis((17.7318399, 4, -9.789048154), (0, -1, 0)), revolution_arc=REVOLVE_8_ANGLE)
    add(part.part.scale(1), mode=Mode.REPLACE)  # the faces are merged on a copy

    # 草图16 → 旋转-薄壁9 (revolve)
    with BuildSketch(Plane(origin=(0, 0, -34.789048154), x_dir=(-1, 0, 0), z_dir=(0, 0, -1))):
        with BuildLine():
            ThreePointArc((7.2681601, 3.85), (6.5181601, 3.1), (7.2681601, 2.35))
            Line((7.2681601, 2.35), (7.2681601, 2.349))
            ThreePointArc((7.2681601, 2.349), (6.5171601, 3.1), (7.2681601, 3.851))
            Line((7.2681601, 3.851), (7.2681601, 3.85))
        make_face()
    revolve(axis=Axis((-7.2681601, 4, -34.789048154), (0, -1, 0)))


solid = part.part
